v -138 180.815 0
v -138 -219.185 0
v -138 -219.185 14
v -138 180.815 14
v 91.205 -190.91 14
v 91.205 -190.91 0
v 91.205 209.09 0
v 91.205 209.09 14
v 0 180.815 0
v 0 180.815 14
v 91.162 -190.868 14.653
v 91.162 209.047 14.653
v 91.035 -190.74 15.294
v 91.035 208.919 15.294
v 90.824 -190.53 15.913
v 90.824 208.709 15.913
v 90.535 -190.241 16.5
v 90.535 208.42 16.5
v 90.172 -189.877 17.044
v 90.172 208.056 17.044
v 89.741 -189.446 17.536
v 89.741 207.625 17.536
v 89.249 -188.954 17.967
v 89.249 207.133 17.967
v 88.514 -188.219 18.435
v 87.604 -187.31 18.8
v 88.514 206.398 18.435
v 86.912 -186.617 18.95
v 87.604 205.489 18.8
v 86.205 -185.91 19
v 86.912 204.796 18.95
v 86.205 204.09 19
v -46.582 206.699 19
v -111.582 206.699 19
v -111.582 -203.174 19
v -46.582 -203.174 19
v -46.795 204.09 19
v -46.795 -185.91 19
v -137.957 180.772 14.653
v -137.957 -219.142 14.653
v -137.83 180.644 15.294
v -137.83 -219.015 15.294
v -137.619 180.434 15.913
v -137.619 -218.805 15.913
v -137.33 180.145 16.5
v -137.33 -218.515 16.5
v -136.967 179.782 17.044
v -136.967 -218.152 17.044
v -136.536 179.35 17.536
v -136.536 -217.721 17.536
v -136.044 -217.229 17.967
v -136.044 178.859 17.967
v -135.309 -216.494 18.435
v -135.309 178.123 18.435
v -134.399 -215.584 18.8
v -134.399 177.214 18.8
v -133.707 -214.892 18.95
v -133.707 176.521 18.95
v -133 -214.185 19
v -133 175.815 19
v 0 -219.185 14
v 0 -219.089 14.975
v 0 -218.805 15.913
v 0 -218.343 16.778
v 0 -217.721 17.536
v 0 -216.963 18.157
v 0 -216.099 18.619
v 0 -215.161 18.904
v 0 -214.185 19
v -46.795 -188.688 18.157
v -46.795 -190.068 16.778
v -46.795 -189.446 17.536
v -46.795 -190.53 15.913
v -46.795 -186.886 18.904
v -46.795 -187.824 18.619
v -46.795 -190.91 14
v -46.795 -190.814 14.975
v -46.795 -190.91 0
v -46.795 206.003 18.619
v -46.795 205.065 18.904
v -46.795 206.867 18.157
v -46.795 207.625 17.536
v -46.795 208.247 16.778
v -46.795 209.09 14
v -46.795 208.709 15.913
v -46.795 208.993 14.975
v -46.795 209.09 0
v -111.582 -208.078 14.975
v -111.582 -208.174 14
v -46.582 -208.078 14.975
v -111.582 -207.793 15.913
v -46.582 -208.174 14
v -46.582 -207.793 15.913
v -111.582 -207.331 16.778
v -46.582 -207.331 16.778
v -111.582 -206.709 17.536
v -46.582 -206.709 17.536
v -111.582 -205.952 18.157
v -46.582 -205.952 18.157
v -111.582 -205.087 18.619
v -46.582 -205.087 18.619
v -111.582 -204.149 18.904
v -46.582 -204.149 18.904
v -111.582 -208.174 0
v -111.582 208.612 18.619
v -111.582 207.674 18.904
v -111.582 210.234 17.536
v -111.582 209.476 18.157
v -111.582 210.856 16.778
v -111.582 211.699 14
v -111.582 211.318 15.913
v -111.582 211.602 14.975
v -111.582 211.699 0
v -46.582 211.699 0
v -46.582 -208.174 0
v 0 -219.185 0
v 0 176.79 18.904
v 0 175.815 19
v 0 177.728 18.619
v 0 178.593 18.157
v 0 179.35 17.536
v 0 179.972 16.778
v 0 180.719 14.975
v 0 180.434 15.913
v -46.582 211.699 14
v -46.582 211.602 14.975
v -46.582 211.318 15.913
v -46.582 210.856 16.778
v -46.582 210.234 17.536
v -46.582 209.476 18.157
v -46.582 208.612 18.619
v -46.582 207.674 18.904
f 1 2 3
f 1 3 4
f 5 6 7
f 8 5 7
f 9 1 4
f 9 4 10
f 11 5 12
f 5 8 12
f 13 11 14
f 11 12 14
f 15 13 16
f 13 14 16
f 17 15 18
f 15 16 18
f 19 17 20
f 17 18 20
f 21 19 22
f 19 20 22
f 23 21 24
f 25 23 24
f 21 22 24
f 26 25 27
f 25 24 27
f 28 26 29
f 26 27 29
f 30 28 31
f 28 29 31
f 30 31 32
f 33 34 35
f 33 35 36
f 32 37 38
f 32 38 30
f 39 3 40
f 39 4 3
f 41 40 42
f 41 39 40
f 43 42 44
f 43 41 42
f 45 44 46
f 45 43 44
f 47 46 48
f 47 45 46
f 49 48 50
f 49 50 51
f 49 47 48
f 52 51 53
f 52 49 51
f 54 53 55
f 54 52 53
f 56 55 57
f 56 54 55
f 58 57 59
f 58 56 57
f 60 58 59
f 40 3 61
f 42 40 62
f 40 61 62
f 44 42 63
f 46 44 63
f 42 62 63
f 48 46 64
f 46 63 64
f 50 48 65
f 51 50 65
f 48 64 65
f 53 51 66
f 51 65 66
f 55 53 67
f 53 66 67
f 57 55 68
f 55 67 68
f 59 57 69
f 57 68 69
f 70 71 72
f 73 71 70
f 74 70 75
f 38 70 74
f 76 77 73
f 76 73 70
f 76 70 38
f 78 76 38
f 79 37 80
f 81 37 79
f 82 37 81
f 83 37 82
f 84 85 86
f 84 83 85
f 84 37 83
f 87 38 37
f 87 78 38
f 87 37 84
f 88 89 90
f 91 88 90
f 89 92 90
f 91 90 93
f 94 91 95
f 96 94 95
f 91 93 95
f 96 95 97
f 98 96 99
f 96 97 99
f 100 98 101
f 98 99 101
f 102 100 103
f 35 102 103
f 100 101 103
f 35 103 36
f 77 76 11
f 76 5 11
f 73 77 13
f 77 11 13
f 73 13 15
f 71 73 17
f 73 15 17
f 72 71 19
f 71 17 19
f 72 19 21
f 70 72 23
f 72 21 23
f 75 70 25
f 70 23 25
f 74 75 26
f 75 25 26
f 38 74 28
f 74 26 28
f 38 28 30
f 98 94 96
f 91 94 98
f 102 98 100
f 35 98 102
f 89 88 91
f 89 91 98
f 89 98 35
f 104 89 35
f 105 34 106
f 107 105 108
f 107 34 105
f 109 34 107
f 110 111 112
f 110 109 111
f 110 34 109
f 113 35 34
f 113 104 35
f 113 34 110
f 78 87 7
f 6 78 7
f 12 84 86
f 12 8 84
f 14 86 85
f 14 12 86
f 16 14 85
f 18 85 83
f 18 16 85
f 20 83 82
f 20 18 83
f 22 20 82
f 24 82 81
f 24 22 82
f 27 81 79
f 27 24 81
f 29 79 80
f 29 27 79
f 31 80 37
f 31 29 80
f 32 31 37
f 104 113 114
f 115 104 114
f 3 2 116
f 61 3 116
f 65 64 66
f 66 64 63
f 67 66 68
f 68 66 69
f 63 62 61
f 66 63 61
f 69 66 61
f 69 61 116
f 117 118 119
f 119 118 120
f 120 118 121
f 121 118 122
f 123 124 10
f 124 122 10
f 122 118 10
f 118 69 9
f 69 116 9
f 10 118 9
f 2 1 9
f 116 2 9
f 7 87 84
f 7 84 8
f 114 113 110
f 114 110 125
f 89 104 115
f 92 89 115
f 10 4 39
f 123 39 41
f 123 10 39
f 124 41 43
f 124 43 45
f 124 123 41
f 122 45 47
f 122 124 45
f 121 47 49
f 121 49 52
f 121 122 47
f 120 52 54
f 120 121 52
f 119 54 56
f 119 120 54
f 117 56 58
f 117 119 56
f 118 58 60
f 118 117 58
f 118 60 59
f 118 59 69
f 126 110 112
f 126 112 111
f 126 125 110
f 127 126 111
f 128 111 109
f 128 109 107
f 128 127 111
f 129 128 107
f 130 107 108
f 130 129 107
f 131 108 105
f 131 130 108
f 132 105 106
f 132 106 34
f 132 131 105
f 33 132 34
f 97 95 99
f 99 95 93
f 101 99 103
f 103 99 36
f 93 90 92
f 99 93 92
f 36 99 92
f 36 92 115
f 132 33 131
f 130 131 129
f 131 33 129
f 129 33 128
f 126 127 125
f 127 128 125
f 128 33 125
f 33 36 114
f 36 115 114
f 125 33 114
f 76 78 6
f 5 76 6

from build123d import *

# Parameters (mm, degrees)
F2_W     = 138
F2_H     = 400
F3_DEPTH = 19
F0_W     = 65
F0_H     = 419.8724787245
F1_W     = 138
F1_H     = 400
F4_R     = 5
F4_2_R   = 5
F4_3_R   = 5


with BuildPart() as f3:
    # F2 (on Top) → F3 (new body)
    with BuildSketch(Plane.XY):
        with Locations((22.204997018, 9.0895046223)):
            Rectangle(F2_W, F2_H)
    extrude(amount=F3_DEPTH)

    # F4#3
    f4_3_edges = [f3.edges().sort_by_distance(p)[0] for p in [
        (22.204997, -190.910495, 19),
        (91.204997, 9.089505, 19),
        (22.204997, 209.089505, 19),
    ]]
    fillet(f4_3_edges, radius=F4_3_R)


with BuildPart() as f3b:
    # F0 (on Top) → F3, piece 2 (new body)
    with BuildSketch(Plane.XY):
        with Locations((-79.0824504346, 1.7623323947)):
            Rectangle(F0_W, F0_H)
    extrude(amount=F3_DEPTH)

    # F4#2
    f4_2_edges = [f3b.edges().sort_by_distance(p)[0] for p in [
        (-79.08245, -208.173907, 19),
        (-79.08245, 211.698572, 19),
    ]]
    fillet(f4_2_edges, radius=F4_2_R)


with BuildPart() as f3c:
    # F1 (on Top) → F3, piece 3 (new body)
    with BuildSketch(Plane.XY):
        with Locations((-69, -19.1852647855)):
            Rectangle(F1_W, F1_H)
    extrude(amount=F3_DEPTH)

    # F4
    f4_edges = [f3c.edges().sort_by_distance(p)[0] for p in [
        (-138, -19.185265, 19),
        (-69, -219.185265, 19),
        (-69, 180.814735, 19),
    ]]
    fillet(f4_edges, radius=F4_R)


solid = Compound([f3.part, f3b.part, f3c.part])
